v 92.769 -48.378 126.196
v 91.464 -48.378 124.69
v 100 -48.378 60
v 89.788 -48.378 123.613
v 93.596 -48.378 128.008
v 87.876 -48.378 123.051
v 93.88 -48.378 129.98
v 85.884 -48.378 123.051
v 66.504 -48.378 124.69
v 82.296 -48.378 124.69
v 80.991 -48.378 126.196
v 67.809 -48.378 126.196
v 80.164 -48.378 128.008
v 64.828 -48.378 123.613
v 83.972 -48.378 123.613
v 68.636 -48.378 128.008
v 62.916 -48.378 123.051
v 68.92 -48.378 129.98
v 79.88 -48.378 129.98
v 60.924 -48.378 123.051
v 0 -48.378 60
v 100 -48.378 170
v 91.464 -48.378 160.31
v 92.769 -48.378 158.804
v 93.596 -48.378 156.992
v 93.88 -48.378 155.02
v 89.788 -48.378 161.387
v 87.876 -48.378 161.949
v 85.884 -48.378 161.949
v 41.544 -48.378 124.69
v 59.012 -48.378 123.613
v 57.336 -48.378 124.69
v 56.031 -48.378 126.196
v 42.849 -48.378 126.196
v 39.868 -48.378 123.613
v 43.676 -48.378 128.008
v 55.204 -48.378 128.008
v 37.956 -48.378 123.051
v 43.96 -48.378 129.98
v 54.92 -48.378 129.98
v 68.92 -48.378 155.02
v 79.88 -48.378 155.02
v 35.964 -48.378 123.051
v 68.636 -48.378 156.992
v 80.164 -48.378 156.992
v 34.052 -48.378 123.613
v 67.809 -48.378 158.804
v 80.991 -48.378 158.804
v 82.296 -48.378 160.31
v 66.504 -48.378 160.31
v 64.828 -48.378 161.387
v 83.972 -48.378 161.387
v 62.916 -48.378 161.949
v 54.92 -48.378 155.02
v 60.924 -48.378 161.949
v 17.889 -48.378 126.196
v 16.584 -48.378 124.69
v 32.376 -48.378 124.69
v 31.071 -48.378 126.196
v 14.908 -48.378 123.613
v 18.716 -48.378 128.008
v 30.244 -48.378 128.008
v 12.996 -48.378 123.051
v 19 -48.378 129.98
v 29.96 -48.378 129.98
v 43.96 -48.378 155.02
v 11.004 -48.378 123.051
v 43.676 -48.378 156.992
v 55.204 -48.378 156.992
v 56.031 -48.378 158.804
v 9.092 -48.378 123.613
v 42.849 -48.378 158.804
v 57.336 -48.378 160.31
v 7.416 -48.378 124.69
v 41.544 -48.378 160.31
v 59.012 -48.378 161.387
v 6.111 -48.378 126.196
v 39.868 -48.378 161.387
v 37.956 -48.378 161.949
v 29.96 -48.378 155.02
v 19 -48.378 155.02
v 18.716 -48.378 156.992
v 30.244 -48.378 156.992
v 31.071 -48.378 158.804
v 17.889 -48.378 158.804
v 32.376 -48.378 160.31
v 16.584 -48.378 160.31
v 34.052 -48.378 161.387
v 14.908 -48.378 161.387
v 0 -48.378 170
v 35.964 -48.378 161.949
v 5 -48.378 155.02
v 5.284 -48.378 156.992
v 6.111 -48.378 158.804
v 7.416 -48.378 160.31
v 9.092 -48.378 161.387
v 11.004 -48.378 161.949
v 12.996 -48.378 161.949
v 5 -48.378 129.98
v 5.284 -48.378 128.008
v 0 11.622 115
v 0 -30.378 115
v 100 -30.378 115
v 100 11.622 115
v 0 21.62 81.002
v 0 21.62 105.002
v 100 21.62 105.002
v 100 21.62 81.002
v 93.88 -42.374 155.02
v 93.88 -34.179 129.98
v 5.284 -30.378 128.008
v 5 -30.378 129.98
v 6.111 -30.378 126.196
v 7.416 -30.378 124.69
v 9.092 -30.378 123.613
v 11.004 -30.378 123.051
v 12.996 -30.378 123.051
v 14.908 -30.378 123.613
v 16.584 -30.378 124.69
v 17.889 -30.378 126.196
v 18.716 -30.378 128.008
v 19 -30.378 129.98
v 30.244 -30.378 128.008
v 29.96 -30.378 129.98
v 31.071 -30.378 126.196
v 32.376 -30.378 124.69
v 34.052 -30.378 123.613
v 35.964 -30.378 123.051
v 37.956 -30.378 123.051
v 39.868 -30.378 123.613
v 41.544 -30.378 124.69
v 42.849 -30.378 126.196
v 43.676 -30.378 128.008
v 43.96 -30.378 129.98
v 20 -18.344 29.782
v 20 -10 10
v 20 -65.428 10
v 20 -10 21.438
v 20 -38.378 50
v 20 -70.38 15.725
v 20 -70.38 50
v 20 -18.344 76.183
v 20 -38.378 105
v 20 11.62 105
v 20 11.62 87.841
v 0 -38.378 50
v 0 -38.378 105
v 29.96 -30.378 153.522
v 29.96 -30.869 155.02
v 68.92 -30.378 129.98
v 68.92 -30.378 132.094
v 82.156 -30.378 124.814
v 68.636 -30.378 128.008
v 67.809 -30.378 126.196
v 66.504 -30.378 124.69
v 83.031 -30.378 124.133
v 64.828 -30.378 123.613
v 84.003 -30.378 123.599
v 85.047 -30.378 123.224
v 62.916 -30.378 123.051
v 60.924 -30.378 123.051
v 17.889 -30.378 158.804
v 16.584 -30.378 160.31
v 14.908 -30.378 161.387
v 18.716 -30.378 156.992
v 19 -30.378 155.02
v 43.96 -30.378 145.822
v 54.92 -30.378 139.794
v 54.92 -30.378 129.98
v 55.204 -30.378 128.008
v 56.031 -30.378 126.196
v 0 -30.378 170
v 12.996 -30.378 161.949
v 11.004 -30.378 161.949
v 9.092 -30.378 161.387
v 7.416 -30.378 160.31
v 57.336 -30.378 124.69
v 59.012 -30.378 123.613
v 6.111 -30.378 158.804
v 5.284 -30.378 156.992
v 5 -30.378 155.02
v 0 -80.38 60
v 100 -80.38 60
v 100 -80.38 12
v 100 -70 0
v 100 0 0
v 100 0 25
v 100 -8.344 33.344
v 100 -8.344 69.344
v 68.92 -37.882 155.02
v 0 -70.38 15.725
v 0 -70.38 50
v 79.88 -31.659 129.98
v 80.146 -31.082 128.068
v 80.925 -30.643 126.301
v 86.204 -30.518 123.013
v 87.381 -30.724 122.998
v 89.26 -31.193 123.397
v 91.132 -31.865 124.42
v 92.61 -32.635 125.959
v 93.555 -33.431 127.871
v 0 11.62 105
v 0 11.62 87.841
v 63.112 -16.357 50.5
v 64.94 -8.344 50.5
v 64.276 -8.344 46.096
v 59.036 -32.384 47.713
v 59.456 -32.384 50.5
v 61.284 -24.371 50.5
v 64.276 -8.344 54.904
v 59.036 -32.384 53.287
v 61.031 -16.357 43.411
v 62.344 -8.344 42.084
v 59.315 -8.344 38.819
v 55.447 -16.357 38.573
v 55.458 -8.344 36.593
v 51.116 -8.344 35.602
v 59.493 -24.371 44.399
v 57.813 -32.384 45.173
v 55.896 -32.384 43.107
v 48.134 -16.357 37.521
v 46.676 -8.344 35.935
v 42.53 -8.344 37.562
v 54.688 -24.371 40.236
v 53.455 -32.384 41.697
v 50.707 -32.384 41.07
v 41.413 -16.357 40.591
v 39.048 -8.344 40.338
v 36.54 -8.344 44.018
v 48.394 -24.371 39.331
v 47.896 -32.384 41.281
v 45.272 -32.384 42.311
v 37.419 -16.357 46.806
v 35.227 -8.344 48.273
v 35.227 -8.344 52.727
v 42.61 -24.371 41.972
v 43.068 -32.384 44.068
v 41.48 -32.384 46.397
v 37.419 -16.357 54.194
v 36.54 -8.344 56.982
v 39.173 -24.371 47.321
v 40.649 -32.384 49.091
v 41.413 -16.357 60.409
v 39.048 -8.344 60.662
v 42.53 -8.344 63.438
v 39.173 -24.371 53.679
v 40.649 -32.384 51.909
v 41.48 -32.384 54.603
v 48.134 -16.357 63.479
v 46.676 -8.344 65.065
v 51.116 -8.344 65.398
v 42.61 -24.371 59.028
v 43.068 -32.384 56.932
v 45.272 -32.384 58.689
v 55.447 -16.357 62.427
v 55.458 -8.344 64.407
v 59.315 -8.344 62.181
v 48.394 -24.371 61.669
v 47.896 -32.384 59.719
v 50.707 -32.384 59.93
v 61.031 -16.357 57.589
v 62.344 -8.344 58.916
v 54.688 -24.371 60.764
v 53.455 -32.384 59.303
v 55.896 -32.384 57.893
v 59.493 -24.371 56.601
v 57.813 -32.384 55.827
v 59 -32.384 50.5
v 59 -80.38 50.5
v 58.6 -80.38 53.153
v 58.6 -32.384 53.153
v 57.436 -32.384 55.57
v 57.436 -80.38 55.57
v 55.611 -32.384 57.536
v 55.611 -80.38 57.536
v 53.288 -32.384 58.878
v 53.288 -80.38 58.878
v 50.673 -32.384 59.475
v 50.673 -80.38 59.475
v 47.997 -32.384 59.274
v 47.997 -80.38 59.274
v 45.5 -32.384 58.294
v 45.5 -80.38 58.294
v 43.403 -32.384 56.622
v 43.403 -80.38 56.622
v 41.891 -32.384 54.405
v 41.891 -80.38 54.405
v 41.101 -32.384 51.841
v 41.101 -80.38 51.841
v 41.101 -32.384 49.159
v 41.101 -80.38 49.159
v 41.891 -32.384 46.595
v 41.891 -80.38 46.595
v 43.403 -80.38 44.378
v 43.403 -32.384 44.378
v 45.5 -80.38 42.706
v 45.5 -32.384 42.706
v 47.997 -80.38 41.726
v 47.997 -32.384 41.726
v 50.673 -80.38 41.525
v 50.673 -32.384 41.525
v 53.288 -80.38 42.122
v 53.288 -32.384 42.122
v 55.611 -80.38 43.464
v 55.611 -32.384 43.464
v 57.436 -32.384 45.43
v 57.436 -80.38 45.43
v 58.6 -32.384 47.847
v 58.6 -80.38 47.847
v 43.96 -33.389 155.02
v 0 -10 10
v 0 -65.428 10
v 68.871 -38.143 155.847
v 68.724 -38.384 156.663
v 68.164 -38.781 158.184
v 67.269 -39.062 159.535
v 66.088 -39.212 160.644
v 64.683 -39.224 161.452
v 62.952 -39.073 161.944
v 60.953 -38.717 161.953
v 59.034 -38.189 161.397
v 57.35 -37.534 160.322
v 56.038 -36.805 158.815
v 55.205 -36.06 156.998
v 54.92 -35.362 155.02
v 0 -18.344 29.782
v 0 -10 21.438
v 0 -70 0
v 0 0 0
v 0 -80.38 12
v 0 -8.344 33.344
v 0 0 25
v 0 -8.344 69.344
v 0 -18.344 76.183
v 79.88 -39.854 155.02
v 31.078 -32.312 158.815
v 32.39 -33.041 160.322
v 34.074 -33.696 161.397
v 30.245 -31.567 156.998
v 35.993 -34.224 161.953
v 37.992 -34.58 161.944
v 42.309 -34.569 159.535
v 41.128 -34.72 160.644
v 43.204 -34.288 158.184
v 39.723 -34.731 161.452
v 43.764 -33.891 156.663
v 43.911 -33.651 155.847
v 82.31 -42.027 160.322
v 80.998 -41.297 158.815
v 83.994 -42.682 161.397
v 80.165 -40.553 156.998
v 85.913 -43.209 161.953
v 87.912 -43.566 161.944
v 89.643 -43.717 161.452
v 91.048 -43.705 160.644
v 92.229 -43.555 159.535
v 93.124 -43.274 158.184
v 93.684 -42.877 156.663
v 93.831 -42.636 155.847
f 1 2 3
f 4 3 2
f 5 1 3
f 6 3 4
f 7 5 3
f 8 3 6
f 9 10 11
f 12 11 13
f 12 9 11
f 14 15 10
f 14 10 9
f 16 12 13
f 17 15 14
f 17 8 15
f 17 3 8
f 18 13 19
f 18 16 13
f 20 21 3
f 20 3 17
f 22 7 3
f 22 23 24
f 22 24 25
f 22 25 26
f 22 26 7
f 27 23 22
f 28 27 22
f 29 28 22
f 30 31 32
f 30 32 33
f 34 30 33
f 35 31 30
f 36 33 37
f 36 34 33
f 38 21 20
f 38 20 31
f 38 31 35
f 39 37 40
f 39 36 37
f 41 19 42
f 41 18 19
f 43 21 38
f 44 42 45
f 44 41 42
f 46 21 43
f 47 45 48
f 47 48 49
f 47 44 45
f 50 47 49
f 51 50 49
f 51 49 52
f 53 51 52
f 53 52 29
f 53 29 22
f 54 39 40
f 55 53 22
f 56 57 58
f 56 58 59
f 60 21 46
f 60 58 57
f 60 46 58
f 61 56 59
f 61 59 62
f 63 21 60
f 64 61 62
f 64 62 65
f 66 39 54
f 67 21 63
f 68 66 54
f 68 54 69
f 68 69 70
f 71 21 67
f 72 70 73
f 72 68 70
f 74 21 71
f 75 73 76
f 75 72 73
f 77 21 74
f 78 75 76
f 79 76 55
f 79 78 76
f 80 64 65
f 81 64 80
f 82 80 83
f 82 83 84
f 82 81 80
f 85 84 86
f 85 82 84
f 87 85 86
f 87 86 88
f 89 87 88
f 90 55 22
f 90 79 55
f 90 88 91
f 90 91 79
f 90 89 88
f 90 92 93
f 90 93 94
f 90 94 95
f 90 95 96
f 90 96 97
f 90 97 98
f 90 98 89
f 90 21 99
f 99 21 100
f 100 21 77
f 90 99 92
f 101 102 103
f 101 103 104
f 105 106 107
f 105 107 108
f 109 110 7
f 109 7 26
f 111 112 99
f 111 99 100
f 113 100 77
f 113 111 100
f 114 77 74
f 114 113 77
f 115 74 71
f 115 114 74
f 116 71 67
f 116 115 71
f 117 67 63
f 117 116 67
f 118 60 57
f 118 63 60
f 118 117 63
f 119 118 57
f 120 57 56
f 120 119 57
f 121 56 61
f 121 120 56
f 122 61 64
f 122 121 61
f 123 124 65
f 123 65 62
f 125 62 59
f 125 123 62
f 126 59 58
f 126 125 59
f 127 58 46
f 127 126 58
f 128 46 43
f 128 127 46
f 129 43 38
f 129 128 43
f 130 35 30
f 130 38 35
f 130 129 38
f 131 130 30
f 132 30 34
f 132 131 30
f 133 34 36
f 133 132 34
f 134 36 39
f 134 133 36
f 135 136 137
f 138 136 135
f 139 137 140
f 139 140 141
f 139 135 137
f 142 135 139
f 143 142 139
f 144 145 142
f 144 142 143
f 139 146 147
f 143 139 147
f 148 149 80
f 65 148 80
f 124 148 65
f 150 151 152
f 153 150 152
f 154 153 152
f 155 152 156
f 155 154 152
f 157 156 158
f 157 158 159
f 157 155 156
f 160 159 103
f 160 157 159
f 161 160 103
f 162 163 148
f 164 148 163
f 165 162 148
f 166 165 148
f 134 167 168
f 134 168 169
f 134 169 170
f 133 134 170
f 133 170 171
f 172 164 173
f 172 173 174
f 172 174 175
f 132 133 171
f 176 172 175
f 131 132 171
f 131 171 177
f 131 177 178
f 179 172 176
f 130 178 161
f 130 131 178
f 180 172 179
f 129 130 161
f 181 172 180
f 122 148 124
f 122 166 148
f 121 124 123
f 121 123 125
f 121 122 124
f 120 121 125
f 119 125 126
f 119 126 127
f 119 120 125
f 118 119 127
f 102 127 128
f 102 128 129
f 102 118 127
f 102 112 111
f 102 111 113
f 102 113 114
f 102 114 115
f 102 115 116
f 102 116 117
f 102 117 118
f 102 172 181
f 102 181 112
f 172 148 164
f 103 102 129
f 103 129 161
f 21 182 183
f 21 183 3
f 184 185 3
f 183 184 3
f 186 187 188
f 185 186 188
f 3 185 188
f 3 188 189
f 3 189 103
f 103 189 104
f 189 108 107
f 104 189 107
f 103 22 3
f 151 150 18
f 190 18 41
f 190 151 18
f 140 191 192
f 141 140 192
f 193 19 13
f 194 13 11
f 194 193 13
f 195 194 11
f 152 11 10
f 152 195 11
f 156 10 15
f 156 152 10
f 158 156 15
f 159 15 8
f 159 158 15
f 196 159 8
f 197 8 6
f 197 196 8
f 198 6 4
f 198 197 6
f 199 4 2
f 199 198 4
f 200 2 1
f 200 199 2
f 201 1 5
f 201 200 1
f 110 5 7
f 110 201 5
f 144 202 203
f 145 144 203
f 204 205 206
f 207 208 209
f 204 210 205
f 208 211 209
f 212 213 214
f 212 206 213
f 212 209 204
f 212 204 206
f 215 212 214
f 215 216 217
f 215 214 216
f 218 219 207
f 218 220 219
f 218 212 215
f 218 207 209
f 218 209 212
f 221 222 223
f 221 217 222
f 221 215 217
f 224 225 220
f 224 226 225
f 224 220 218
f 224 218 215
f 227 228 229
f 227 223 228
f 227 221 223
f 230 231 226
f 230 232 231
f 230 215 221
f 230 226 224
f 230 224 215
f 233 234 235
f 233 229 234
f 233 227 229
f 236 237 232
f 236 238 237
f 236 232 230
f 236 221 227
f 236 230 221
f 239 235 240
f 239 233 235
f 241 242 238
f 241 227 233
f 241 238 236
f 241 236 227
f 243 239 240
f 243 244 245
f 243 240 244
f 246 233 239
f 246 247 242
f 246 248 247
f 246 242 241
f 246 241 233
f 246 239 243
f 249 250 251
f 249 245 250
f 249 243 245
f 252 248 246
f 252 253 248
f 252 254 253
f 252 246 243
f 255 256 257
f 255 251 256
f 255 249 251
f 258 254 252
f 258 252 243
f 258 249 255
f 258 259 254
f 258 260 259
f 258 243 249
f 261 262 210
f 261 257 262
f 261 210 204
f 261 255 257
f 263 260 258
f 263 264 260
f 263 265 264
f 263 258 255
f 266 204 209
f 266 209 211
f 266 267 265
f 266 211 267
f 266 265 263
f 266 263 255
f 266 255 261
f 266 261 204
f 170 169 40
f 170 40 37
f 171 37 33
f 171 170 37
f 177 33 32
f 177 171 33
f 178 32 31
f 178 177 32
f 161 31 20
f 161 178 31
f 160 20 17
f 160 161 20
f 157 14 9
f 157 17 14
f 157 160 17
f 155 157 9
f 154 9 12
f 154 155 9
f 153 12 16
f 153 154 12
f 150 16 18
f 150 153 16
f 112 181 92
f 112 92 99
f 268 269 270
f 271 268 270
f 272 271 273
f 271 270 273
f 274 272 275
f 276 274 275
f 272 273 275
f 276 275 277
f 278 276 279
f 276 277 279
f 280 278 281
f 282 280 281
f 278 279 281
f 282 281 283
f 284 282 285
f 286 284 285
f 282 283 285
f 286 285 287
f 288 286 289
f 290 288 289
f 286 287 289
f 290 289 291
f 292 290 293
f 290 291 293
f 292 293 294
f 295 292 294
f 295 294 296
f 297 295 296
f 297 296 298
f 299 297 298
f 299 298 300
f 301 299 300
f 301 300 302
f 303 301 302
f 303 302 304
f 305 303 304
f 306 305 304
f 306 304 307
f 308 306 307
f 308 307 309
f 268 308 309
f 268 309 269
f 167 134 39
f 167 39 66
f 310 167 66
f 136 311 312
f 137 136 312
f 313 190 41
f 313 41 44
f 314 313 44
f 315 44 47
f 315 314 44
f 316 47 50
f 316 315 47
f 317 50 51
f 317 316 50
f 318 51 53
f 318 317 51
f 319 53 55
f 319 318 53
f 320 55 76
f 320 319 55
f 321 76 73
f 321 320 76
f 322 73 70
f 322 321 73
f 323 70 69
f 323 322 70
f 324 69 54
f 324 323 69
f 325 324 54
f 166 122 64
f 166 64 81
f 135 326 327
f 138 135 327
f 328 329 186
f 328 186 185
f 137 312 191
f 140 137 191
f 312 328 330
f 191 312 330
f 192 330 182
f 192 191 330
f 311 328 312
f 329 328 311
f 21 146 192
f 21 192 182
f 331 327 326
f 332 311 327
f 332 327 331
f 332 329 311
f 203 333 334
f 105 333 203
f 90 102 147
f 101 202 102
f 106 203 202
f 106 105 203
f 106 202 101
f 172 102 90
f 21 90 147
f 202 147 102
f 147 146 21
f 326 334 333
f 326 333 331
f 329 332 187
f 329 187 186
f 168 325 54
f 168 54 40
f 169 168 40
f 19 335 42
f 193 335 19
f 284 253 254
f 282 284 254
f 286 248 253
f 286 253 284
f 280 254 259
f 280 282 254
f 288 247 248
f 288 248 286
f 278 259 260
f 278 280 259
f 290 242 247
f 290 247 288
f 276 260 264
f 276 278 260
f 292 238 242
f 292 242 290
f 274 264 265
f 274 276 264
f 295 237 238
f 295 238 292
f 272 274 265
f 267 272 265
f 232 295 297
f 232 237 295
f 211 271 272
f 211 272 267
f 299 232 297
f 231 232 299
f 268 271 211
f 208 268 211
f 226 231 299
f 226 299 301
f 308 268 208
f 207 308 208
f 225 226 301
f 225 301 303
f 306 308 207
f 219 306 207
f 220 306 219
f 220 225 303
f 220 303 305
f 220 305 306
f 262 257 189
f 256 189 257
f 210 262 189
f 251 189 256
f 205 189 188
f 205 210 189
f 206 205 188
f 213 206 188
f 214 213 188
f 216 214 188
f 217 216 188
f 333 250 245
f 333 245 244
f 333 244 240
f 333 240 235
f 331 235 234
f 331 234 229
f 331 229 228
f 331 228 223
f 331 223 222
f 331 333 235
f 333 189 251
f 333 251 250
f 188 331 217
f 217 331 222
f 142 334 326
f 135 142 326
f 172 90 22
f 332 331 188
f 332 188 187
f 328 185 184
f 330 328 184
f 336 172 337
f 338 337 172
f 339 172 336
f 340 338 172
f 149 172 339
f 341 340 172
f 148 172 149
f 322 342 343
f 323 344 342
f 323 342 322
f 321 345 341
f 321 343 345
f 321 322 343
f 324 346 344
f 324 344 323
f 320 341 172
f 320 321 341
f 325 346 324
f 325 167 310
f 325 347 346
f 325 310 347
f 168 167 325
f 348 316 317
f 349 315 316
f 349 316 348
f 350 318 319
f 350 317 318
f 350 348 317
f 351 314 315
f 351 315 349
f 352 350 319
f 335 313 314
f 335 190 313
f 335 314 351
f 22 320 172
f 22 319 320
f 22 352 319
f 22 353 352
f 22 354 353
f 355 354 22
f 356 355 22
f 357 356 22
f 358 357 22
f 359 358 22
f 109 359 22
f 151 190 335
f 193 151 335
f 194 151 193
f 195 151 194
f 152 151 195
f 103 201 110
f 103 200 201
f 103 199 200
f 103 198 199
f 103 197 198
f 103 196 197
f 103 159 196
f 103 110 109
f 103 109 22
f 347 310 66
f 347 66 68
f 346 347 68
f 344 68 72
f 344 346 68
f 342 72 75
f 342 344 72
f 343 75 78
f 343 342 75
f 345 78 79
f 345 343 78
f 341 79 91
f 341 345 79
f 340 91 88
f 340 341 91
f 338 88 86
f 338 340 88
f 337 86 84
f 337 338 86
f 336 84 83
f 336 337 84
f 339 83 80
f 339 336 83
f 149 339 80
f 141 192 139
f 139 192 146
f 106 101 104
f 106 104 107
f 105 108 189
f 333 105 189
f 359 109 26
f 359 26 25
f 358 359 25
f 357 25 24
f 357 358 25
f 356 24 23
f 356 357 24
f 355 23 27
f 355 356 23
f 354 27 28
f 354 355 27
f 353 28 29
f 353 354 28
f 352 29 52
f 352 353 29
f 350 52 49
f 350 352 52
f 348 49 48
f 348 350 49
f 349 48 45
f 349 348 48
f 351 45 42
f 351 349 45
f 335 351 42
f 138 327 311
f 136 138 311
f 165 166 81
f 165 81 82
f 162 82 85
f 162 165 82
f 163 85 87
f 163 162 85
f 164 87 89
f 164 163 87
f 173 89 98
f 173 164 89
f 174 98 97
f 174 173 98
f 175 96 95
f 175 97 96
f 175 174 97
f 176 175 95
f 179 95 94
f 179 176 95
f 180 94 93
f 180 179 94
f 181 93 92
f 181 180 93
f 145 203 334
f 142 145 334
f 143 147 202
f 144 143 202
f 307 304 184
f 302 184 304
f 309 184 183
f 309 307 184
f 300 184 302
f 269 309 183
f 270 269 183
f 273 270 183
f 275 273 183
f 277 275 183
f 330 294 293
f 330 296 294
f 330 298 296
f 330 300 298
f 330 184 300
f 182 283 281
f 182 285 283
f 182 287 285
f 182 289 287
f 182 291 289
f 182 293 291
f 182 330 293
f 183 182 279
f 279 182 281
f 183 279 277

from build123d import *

# Parameters (mm, degrees)
RESSALTO_EXTRUS_O1_DEPTH = 100
CORTE_EXTRUS_O1_DEPTH    = 51.001510114
CORTE_EXTRUS_O4_DEPTH    = 87
CORTE_EXTRUS_O6_DEPTH    = 20
CORTE_EXTRUS_O8_REACH    = 104
ESBO_O10_R               = 9
ESBO_O12_R               = 14.94
CORTE_EXTRUS_O10_DEPTH   = 24.04
CORTE_EXTRUS_O10_TAPER   = 12.85


with BuildPart() as part:
    # Esboço3 → Ressalto-extrusão1 (new body)
    with BuildSketch(Plane(origin=(0, 0, 0), x_dir=(0, 0, -1), z_dir=(1, 0, 0))):
        Polygon((0, 0), (0, -70), (-12, -80.38), (-60, -80.38), (-60, -48.378489886), (-170, -48.378489886), (-170, -30.378489886), (-115, -30.378489886), (-115, 11.621510114), (-105.001510114, 21.62), (-81.001510114, 21.62), (-69.343860018, -8.343860018), (-33.343860018, -8.343860018), (-25, 0), align=None)
    extrude(amount=RESSALTO_EXTRUS_O1_DEPTH)

    # Esboço5 → Corte-extrusão1 (cut, through all)
    with BuildSketch(Plane(origin=(0, -30.378489886, 0), x_dir=(1, 0, 0), z_dir=(0, 1, 0))):
        with BuildLine():
            Line((5, -155.02), (5, -129.98))
            ThreePointArc((5, -129.98), (12, -122.98), (19, -129.98))
            Line((19, -129.98), (19, -155.02))
            ThreePointArc((19, -155.02), (12, -162.02), (5, -155.02))
        make_face()
        with BuildLine():
            Line((29.96, -155.02), (29.96, -129.98))
            ThreePointArc((29.96, -129.98), (36.96, -122.98), (43.96, -129.98))
            Line((43.96, -129.98), (43.96, -155.02))
            ThreePointArc((43.96, -155.02), (36.96, -162.02), (29.96, -155.02))
        make_face()
        with BuildLine():
            Line((54.92, -155.02), (54.92, -129.98))
            ThreePointArc((54.92, -129.98), (61.92, -122.98), (68.92, -129.98))
            Line((68.92, -129.98), (68.92, -155.02))
            ThreePointArc((68.92, -155.02), (61.92, -162.02), (54.92, -155.02))
        make_face()
        with BuildLine():
            Line((79.88, -155.02), (79.88, -129.98))
            ThreePointArc((79.88, -129.98), (86.88, -122.98), (93.88, -129.98))
            Line((93.88, -129.98), (93.88, -155.02))
            ThreePointArc((93.88, -155.02), (86.88, -162.02), (79.88, -155.02))
        make_face()
    extrude(amount=-CORTE_EXTRUS_O1_DEPTH, mode=Mode.SUBTRACT)

    # Esboço6 → Corte-extrusão4 (cut)
    with BuildSketch(Plane(origin=(3.989809214, 22.165606742, 7.25419857), x_dir=(0.985680811, -0.160257749, -0.052447991), z_dir=(0.168621878, 0.936788213, 0.306585233))):
        Polygon((-4.047769995, -171.016408889), (97.404950637, -176.615111976), (97.404950637, -118.744566791), align=None)
    extrude(amount=CORTE_EXTRUS_O4_DEPTH, mode=Mode.SUBTRACT)

    # Esboço9 → Corte-extrusão6 (cut)
    with BuildSketch(Plane.ZY):
        Polygon((105, 11.62), (87.841109365, 11.62), (76.183459269, -18.343860018), (29.781857804, -18.343860018), (21.437997786, -10), (10, -10), (10, -65.427954016), (15.724908652, -70.38), (50, -70.38), (50, -38.378489886), (105, -38.378489886), align=None)
    extrude(amount=-CORTE_EXTRUS_O6_DEPTH, mode=Mode.SUBTRACT)

    # Esboço10 → Corte-extrusão8 (cut, up to next)
    with BuildSketch(Plane.XZ.offset(80.38), mode=Mode.PRIVATE) as corte_extrus_o8_sk1:
        with Locations((50, 50.5)):
            Circle(ESBO_O10_R)
    corte_extrus_o8_tool1 = extrude(corte_extrus_o8_sk1.sketch, amount=-CORTE_EXTRUS_O8_REACH, mode=Mode.PRIVATE) & part.part
    add(corte_extrus_o8_tool1.solids().sort_by_distance((50, -80.38, 50.5))[0], mode=Mode.SUBTRACT)

    # Esboço12 → Corte-extrusão10 (cut)
    with BuildSketch(Plane(origin=(0, -8.343860018, 0), x_dir=(1, 0, 0), z_dir=(0, 1, 0))):
        with Locations((50, -50.5)):
            Circle(ESBO_O12_R)
    extrude(amount=-CORTE_EXTRUS_O10_DEPTH, taper=CORTE_EXTRUS_O10_TAPER, mode=Mode.SUBTRACT)


solid = part.part
